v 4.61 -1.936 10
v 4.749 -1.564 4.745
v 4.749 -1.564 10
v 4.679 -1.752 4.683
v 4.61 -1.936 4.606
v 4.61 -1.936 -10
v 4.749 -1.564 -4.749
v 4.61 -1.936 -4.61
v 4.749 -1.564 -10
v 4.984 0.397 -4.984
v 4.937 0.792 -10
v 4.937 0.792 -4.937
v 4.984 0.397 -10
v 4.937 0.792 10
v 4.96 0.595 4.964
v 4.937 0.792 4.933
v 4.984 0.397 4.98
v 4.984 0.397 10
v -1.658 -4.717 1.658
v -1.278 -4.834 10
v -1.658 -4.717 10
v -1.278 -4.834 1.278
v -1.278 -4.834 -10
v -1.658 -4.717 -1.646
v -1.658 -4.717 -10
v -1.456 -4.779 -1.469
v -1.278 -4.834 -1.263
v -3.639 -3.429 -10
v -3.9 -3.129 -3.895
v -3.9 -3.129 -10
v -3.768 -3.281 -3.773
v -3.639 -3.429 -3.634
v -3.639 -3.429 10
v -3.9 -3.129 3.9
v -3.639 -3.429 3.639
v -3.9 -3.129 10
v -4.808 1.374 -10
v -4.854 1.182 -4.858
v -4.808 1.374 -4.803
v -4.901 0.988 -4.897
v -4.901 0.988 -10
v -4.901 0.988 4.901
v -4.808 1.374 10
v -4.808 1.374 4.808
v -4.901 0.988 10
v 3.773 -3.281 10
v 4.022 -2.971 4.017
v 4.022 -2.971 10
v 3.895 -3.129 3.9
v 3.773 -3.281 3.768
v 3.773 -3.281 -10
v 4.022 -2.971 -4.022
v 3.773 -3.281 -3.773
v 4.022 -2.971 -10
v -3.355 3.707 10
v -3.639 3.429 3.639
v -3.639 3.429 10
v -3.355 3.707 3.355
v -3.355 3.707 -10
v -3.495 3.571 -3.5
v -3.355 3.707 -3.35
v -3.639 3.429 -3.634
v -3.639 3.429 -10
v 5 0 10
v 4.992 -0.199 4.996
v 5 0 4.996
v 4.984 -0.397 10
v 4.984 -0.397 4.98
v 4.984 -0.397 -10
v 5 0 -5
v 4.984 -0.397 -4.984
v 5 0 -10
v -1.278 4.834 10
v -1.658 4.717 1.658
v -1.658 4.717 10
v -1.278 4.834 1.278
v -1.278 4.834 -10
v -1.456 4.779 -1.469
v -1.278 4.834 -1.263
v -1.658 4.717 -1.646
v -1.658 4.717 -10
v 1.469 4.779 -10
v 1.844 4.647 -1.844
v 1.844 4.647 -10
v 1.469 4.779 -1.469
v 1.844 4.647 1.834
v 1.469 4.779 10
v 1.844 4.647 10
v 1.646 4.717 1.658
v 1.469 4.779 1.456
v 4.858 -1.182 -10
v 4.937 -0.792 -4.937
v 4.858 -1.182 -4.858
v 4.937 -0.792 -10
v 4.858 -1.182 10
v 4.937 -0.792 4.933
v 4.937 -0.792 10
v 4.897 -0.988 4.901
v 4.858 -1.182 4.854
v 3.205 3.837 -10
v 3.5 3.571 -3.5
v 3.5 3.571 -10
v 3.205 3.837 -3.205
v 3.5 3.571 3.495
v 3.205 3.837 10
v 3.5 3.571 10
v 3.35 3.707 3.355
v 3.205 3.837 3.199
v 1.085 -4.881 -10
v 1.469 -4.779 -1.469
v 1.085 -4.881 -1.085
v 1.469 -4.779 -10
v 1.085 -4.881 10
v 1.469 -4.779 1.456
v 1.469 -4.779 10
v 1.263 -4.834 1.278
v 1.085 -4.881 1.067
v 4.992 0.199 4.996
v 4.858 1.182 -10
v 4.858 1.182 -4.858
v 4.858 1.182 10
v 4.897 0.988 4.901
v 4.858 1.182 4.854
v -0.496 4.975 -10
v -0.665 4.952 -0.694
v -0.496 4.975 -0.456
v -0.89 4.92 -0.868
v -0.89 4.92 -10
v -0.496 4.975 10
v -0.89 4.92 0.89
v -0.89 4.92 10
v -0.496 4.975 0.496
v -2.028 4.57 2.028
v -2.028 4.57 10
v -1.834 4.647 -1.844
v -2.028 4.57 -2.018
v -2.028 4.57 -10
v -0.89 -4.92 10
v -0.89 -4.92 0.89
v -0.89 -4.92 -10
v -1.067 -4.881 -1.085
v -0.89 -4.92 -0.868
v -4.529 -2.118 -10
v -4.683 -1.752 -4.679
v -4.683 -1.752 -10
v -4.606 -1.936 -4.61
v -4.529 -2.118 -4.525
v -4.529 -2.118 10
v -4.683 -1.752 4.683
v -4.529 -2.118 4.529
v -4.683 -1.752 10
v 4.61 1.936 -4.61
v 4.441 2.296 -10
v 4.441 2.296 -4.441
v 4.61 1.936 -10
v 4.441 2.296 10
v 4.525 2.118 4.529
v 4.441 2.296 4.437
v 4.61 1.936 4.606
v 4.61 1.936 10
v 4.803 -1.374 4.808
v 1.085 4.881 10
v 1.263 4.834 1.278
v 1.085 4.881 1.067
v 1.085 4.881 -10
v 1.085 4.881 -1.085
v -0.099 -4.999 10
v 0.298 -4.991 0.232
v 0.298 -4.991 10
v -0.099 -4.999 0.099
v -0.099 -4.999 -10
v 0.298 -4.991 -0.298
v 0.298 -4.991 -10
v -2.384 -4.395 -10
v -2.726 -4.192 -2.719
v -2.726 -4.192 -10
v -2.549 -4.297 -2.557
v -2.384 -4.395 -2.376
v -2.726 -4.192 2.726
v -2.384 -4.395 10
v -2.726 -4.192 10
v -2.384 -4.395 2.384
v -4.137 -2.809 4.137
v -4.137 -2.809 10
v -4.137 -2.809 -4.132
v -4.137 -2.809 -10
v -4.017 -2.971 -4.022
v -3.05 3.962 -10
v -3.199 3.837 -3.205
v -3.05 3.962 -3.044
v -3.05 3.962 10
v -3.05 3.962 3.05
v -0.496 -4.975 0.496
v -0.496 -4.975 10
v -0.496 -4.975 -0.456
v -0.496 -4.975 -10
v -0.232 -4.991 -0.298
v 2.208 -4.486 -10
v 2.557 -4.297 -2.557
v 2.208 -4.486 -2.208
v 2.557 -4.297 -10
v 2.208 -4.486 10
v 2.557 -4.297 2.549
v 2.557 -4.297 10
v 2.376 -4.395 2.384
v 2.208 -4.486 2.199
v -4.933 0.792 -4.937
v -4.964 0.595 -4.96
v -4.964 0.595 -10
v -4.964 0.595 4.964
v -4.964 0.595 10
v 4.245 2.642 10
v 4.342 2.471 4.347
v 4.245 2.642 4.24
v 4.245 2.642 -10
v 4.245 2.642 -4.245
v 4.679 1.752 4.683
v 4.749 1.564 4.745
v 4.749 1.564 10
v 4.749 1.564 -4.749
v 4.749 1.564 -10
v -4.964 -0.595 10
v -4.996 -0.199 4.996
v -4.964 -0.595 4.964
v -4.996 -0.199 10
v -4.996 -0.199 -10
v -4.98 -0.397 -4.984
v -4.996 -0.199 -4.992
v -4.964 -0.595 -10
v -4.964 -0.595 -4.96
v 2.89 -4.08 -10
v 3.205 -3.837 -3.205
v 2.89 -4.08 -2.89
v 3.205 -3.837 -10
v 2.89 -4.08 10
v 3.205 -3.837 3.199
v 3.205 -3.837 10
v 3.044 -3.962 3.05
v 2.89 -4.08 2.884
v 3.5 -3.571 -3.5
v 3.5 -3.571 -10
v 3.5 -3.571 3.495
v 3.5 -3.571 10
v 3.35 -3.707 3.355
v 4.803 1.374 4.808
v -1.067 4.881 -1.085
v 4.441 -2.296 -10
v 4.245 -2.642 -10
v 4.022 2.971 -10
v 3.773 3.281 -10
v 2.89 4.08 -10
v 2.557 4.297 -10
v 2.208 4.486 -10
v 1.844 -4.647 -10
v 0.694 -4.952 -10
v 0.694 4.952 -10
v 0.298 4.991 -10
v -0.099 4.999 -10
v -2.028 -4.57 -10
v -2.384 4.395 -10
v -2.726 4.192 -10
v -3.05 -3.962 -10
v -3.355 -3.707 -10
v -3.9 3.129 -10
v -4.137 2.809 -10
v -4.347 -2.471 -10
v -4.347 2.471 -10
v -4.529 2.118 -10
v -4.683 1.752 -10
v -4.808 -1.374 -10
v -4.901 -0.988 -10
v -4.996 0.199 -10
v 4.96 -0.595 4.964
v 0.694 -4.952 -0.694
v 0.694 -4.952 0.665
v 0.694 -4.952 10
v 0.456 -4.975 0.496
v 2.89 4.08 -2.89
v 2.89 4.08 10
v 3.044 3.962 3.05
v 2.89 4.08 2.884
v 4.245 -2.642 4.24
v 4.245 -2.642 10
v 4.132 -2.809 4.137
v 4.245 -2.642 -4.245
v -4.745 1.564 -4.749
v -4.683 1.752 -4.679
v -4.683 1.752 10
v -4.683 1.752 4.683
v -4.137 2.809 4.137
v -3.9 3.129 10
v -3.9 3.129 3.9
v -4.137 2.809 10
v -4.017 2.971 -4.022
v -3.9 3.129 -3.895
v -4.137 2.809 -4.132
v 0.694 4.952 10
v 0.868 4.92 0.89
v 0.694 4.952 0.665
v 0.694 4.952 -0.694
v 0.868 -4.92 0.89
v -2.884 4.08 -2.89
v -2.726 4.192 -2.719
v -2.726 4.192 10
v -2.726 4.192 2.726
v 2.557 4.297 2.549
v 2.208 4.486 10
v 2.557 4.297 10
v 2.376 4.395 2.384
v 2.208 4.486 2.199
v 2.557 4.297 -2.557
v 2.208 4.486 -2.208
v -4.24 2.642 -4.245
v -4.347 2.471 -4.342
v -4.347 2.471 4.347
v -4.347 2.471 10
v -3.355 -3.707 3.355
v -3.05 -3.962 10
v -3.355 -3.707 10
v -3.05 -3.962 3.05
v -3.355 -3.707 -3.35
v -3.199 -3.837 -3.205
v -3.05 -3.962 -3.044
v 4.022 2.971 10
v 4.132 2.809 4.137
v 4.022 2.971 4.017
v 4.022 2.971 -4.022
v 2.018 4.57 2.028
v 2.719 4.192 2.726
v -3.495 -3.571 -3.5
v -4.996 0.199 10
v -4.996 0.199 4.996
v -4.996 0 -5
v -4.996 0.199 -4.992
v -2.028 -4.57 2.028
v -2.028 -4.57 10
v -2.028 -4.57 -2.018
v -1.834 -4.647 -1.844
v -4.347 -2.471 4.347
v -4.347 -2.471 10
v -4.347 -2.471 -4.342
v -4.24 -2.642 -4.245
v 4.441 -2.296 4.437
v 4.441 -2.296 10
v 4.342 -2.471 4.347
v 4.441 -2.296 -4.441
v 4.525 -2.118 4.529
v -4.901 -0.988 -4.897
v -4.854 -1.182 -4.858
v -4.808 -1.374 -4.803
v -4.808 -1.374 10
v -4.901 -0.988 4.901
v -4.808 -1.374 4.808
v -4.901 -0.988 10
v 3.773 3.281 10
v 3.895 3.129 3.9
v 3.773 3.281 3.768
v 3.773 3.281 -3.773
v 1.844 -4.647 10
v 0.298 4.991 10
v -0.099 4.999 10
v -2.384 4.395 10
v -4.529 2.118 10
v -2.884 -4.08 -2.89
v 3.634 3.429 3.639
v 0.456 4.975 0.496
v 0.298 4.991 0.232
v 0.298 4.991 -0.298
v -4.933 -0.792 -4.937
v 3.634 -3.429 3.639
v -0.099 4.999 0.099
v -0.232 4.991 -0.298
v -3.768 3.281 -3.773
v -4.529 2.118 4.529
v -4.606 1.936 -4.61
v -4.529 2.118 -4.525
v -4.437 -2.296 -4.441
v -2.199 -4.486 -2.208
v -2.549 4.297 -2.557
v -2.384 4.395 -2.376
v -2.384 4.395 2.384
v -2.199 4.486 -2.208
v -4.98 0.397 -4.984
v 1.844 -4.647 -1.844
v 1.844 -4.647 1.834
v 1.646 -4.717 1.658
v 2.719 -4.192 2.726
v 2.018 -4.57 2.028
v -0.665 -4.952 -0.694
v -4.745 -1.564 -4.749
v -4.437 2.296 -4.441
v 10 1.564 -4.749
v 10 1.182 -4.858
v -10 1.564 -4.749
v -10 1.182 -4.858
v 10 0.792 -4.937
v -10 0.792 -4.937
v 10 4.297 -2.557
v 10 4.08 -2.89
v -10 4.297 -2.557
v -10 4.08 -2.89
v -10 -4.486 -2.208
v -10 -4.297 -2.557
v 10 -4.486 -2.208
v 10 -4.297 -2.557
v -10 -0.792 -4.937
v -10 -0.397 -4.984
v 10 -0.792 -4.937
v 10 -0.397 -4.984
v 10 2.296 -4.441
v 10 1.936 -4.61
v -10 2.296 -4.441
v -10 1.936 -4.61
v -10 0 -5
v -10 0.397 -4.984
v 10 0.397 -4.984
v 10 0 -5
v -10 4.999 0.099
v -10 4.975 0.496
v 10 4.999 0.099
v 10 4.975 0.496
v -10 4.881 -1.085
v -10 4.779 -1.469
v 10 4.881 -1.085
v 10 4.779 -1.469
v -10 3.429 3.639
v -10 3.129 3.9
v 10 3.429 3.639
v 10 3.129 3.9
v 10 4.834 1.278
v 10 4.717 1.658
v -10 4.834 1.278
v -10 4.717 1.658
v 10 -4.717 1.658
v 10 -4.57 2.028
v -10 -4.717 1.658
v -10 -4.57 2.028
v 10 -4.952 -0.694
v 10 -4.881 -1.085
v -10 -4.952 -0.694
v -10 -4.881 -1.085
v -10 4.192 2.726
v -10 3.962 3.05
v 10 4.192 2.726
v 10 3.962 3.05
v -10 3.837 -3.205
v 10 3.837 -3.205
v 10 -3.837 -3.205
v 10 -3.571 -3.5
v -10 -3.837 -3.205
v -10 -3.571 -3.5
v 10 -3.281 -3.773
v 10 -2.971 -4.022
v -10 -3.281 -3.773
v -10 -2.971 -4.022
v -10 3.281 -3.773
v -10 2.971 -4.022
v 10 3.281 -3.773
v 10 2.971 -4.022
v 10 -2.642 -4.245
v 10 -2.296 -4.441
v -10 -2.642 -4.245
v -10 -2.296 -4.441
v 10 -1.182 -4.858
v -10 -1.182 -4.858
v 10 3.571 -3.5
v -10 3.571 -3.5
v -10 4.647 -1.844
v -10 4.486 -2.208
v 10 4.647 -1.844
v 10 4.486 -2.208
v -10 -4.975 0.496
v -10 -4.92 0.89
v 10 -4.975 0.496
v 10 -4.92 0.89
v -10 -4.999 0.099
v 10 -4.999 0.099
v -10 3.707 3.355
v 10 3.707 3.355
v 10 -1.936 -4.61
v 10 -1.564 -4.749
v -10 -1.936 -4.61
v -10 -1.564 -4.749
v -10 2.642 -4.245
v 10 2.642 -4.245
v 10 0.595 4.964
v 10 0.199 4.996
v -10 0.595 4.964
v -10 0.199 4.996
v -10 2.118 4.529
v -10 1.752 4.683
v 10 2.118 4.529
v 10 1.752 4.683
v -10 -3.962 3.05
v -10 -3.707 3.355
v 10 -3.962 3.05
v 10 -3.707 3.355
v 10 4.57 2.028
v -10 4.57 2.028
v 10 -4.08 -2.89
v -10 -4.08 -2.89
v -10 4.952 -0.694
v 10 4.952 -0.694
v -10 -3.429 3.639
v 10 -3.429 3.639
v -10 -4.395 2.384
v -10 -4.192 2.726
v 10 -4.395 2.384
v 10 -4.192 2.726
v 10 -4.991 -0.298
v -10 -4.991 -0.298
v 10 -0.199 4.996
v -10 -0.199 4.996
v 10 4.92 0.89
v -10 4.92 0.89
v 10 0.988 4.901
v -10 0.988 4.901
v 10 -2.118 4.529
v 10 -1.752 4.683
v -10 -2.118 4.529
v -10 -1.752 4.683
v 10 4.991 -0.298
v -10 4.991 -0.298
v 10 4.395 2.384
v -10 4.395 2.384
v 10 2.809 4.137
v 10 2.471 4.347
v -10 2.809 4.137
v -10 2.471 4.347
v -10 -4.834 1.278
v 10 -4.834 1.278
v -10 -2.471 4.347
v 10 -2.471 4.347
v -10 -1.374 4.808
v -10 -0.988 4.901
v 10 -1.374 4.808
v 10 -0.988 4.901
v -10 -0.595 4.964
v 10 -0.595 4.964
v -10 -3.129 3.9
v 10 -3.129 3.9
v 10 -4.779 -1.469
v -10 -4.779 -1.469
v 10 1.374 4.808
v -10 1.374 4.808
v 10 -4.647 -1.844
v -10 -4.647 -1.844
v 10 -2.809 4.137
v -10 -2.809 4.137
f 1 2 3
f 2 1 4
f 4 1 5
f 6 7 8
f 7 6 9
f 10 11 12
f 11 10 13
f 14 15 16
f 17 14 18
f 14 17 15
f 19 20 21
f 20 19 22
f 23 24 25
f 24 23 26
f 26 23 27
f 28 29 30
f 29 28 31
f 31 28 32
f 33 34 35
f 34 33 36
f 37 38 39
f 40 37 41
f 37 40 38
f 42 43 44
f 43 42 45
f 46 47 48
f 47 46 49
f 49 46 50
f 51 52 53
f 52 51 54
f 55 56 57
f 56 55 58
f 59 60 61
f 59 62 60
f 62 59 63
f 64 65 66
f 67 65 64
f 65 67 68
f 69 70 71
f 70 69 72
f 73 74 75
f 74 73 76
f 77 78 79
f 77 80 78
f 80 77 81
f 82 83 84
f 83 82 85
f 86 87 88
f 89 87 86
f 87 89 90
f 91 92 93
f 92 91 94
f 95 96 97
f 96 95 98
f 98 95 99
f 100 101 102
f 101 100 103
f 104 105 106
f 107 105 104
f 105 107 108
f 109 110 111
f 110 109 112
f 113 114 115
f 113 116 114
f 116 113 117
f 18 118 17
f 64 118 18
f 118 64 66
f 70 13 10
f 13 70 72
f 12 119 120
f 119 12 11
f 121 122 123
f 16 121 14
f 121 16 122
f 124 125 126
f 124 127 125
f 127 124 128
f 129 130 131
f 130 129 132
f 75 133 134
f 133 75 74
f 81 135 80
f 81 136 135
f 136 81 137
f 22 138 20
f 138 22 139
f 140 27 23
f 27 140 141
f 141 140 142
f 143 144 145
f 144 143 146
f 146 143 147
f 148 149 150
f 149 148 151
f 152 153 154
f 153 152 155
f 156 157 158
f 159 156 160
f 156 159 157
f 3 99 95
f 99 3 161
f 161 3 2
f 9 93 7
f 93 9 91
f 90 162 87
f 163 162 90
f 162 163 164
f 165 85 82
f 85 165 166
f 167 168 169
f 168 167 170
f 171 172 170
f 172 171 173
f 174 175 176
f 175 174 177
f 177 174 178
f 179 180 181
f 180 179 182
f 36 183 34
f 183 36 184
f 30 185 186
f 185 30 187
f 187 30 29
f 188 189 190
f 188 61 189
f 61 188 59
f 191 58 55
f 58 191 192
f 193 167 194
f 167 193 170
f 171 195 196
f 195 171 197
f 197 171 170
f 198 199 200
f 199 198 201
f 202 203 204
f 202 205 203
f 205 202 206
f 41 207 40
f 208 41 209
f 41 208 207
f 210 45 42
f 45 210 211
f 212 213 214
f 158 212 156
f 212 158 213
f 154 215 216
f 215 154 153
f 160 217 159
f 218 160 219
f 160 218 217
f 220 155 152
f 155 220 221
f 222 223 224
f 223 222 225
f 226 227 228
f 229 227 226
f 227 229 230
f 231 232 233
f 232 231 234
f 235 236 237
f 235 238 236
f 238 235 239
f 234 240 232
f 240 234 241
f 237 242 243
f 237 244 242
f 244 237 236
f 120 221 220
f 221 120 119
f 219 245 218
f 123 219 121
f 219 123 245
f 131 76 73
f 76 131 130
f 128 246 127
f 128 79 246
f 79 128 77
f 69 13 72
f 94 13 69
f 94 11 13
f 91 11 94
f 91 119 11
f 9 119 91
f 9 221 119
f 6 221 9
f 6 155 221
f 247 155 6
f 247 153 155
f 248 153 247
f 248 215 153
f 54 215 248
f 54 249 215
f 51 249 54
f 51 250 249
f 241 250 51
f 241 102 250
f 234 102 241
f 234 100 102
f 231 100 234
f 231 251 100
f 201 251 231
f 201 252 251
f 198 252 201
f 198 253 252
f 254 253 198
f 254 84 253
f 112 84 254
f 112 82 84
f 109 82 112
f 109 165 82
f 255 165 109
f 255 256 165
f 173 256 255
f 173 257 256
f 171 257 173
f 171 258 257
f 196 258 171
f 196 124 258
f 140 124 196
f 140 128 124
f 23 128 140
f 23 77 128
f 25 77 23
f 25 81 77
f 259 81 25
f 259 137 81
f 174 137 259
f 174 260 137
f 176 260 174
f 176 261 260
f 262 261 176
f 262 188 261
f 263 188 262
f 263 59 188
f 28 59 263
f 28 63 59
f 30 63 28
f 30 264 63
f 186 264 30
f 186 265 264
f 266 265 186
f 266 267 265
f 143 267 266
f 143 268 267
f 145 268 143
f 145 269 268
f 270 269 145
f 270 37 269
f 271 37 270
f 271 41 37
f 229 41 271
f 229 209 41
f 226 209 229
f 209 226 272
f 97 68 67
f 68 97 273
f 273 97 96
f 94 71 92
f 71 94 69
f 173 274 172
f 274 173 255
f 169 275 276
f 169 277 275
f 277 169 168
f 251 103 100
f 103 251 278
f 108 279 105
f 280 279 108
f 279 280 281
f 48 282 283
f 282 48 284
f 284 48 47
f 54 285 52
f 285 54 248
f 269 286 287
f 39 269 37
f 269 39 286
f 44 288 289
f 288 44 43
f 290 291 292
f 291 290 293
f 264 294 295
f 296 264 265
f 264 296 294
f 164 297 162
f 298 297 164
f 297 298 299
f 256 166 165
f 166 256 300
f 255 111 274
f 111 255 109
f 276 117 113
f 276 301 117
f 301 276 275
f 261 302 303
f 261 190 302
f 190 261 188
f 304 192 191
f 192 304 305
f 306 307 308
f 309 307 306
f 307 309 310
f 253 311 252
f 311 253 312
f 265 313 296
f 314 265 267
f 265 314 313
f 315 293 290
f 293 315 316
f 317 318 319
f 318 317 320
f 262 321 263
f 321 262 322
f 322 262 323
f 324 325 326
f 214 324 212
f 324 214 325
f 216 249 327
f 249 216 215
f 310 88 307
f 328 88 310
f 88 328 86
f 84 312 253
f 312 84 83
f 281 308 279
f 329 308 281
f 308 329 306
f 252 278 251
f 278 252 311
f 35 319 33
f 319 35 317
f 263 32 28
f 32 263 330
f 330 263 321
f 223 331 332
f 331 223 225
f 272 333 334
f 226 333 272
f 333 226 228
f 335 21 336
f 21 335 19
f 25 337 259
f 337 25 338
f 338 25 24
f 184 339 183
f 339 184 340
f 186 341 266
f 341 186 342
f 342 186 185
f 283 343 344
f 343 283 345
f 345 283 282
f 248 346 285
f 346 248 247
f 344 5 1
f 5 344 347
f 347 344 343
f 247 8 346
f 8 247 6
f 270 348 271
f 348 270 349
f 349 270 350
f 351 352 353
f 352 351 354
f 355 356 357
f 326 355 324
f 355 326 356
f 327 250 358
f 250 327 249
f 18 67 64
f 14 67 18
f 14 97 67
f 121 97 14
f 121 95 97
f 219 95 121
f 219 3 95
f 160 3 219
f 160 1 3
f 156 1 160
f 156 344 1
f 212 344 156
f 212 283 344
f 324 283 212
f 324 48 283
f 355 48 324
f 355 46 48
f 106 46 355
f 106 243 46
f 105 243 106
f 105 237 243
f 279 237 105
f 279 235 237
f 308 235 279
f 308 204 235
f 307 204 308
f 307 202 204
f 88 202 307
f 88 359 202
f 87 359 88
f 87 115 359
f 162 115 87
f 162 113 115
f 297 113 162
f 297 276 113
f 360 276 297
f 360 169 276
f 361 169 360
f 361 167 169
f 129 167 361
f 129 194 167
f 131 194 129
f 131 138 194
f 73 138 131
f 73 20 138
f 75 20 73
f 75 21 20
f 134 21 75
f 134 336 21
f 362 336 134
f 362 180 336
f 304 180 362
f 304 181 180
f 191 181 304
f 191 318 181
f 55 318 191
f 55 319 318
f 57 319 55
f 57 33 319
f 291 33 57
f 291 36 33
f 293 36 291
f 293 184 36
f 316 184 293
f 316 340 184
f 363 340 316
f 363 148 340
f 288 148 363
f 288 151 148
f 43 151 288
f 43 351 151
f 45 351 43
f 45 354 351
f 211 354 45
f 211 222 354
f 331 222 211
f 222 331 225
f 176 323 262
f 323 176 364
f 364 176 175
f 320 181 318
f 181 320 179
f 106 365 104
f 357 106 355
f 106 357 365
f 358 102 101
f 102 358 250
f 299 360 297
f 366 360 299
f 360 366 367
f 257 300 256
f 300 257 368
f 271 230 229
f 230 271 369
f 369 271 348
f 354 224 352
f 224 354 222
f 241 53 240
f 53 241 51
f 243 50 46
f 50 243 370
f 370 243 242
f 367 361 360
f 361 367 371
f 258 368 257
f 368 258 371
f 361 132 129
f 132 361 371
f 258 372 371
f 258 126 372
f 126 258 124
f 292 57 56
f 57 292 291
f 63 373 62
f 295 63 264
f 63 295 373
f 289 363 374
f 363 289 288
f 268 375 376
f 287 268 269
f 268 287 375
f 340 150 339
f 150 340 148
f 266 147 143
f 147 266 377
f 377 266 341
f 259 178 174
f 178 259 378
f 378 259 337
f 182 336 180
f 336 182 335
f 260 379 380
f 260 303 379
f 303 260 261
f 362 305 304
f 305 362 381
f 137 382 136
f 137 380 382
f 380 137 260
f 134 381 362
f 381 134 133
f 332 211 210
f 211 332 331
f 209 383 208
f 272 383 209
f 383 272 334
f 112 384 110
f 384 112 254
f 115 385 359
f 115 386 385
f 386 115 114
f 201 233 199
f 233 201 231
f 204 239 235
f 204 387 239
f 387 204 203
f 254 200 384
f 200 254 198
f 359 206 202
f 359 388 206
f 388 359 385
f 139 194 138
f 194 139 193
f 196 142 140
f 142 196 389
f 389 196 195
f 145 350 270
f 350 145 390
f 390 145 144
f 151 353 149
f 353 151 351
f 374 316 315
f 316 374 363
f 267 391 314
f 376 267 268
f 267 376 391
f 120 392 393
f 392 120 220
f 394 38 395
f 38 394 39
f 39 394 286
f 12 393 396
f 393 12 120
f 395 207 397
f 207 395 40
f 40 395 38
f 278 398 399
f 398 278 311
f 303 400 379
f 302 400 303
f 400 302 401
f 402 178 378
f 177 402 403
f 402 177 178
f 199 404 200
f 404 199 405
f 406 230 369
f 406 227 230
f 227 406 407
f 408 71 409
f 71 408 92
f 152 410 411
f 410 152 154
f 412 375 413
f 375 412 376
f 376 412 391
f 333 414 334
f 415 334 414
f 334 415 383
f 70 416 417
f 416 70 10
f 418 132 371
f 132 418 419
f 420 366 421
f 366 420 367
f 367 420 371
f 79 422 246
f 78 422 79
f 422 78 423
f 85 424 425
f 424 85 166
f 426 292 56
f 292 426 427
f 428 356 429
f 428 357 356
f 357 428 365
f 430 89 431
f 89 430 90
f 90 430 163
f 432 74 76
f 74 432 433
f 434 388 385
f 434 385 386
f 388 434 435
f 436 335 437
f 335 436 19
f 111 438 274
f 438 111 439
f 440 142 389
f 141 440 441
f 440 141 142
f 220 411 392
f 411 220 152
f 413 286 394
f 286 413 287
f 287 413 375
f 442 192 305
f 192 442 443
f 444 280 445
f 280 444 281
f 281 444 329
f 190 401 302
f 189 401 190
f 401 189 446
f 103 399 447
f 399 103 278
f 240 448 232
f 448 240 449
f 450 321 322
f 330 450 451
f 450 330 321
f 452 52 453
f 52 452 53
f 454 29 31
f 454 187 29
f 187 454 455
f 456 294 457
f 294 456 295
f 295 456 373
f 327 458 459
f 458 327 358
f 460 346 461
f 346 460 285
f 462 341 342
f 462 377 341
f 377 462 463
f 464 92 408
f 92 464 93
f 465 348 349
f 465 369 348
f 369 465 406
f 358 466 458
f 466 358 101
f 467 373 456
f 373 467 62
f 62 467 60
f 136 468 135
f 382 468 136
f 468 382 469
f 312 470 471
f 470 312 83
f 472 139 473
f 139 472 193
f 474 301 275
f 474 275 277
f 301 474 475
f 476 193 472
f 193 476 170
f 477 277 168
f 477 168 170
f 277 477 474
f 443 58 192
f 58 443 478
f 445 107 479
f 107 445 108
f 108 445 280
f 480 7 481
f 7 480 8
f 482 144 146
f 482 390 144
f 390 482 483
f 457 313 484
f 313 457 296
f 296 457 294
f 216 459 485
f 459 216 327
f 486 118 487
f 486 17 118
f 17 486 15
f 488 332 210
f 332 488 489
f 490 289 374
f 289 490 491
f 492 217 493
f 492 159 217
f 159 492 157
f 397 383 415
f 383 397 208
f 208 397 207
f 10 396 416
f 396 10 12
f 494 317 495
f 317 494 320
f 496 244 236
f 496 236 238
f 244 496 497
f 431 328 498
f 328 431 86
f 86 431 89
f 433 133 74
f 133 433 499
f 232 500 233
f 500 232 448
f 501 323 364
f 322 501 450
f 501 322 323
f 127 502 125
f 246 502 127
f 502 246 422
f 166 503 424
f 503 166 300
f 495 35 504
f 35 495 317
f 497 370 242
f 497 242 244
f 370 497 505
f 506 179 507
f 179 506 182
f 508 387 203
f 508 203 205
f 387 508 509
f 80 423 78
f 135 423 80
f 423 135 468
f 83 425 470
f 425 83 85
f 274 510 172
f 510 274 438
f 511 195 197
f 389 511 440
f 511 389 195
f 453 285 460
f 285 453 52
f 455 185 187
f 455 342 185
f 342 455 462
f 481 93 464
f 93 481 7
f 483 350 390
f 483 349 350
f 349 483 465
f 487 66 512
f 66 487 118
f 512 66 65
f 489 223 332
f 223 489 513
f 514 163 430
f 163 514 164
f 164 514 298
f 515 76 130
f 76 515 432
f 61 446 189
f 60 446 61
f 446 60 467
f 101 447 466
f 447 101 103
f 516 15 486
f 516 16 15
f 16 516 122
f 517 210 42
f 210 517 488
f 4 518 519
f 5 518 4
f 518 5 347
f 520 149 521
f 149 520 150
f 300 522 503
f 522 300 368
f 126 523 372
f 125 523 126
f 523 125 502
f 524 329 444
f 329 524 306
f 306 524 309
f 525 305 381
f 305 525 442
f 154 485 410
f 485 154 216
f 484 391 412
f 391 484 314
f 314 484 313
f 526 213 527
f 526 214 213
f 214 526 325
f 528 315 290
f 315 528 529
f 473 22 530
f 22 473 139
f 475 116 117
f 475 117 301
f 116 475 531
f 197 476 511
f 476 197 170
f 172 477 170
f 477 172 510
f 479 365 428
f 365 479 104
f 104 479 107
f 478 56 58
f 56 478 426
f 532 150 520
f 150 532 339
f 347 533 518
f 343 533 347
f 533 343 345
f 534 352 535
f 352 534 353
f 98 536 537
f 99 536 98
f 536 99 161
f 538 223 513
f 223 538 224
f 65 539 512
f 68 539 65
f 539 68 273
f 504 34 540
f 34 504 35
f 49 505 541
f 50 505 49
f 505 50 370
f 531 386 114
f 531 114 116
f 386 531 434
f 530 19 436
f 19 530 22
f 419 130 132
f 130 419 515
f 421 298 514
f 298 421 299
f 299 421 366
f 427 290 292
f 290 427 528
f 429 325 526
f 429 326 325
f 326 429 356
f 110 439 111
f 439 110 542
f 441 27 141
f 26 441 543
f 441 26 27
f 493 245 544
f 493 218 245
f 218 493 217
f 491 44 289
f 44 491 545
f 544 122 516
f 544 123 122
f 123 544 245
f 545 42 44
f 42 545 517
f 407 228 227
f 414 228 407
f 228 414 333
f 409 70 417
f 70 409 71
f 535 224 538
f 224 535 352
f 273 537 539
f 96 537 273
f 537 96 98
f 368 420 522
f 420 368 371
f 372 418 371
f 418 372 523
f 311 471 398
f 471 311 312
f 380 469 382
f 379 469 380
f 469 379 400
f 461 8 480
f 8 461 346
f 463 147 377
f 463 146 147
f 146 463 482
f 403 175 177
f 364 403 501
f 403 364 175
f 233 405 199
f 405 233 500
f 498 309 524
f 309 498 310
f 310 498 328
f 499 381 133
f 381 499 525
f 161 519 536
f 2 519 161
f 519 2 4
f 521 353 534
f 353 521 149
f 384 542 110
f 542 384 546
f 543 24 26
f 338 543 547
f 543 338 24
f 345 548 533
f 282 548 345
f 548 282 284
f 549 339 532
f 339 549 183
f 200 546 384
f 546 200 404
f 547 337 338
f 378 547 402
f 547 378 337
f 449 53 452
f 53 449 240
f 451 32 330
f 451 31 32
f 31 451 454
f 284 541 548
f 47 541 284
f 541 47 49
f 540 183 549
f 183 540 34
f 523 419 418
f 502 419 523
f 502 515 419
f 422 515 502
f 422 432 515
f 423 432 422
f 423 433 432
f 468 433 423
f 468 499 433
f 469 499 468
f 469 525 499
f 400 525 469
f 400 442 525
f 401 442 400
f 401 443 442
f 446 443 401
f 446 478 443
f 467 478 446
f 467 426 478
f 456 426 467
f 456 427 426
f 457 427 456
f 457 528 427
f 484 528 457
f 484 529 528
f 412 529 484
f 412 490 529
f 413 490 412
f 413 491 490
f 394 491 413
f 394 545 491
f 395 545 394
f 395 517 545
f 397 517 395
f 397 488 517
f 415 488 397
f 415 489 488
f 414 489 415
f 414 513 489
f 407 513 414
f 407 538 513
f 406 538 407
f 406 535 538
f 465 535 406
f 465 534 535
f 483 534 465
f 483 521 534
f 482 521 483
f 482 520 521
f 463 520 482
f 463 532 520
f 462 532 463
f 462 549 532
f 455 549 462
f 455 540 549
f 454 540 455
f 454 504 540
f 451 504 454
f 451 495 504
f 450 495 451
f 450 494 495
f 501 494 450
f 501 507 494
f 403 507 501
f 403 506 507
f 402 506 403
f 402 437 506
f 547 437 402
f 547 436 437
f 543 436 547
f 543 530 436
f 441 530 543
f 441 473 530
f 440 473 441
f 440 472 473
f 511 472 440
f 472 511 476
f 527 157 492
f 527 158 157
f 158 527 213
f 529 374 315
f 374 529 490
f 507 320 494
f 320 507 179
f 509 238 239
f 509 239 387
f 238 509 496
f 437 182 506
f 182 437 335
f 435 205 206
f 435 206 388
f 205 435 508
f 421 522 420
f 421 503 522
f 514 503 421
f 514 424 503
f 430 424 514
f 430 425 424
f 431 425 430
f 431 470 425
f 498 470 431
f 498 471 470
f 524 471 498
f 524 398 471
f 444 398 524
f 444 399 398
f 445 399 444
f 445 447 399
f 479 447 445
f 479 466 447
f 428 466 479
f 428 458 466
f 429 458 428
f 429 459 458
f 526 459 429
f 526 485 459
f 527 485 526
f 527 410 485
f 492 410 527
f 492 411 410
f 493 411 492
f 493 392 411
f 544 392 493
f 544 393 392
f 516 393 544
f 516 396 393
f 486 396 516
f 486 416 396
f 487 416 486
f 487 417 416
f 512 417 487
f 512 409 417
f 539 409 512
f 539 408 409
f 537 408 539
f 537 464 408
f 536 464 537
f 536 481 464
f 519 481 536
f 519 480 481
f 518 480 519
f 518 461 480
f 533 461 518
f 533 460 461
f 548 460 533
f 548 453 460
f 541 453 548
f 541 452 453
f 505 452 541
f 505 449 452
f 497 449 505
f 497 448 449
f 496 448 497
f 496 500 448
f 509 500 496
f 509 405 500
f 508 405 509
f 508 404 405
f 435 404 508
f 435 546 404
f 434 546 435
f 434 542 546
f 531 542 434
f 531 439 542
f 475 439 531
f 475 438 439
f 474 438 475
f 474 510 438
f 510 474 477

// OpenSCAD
$fa=1;
$fs=0.4;

cylinder(h=20,r=5,center=true);
rotate([0,90,0])
cylinder(h=20,r=5,center=true);
